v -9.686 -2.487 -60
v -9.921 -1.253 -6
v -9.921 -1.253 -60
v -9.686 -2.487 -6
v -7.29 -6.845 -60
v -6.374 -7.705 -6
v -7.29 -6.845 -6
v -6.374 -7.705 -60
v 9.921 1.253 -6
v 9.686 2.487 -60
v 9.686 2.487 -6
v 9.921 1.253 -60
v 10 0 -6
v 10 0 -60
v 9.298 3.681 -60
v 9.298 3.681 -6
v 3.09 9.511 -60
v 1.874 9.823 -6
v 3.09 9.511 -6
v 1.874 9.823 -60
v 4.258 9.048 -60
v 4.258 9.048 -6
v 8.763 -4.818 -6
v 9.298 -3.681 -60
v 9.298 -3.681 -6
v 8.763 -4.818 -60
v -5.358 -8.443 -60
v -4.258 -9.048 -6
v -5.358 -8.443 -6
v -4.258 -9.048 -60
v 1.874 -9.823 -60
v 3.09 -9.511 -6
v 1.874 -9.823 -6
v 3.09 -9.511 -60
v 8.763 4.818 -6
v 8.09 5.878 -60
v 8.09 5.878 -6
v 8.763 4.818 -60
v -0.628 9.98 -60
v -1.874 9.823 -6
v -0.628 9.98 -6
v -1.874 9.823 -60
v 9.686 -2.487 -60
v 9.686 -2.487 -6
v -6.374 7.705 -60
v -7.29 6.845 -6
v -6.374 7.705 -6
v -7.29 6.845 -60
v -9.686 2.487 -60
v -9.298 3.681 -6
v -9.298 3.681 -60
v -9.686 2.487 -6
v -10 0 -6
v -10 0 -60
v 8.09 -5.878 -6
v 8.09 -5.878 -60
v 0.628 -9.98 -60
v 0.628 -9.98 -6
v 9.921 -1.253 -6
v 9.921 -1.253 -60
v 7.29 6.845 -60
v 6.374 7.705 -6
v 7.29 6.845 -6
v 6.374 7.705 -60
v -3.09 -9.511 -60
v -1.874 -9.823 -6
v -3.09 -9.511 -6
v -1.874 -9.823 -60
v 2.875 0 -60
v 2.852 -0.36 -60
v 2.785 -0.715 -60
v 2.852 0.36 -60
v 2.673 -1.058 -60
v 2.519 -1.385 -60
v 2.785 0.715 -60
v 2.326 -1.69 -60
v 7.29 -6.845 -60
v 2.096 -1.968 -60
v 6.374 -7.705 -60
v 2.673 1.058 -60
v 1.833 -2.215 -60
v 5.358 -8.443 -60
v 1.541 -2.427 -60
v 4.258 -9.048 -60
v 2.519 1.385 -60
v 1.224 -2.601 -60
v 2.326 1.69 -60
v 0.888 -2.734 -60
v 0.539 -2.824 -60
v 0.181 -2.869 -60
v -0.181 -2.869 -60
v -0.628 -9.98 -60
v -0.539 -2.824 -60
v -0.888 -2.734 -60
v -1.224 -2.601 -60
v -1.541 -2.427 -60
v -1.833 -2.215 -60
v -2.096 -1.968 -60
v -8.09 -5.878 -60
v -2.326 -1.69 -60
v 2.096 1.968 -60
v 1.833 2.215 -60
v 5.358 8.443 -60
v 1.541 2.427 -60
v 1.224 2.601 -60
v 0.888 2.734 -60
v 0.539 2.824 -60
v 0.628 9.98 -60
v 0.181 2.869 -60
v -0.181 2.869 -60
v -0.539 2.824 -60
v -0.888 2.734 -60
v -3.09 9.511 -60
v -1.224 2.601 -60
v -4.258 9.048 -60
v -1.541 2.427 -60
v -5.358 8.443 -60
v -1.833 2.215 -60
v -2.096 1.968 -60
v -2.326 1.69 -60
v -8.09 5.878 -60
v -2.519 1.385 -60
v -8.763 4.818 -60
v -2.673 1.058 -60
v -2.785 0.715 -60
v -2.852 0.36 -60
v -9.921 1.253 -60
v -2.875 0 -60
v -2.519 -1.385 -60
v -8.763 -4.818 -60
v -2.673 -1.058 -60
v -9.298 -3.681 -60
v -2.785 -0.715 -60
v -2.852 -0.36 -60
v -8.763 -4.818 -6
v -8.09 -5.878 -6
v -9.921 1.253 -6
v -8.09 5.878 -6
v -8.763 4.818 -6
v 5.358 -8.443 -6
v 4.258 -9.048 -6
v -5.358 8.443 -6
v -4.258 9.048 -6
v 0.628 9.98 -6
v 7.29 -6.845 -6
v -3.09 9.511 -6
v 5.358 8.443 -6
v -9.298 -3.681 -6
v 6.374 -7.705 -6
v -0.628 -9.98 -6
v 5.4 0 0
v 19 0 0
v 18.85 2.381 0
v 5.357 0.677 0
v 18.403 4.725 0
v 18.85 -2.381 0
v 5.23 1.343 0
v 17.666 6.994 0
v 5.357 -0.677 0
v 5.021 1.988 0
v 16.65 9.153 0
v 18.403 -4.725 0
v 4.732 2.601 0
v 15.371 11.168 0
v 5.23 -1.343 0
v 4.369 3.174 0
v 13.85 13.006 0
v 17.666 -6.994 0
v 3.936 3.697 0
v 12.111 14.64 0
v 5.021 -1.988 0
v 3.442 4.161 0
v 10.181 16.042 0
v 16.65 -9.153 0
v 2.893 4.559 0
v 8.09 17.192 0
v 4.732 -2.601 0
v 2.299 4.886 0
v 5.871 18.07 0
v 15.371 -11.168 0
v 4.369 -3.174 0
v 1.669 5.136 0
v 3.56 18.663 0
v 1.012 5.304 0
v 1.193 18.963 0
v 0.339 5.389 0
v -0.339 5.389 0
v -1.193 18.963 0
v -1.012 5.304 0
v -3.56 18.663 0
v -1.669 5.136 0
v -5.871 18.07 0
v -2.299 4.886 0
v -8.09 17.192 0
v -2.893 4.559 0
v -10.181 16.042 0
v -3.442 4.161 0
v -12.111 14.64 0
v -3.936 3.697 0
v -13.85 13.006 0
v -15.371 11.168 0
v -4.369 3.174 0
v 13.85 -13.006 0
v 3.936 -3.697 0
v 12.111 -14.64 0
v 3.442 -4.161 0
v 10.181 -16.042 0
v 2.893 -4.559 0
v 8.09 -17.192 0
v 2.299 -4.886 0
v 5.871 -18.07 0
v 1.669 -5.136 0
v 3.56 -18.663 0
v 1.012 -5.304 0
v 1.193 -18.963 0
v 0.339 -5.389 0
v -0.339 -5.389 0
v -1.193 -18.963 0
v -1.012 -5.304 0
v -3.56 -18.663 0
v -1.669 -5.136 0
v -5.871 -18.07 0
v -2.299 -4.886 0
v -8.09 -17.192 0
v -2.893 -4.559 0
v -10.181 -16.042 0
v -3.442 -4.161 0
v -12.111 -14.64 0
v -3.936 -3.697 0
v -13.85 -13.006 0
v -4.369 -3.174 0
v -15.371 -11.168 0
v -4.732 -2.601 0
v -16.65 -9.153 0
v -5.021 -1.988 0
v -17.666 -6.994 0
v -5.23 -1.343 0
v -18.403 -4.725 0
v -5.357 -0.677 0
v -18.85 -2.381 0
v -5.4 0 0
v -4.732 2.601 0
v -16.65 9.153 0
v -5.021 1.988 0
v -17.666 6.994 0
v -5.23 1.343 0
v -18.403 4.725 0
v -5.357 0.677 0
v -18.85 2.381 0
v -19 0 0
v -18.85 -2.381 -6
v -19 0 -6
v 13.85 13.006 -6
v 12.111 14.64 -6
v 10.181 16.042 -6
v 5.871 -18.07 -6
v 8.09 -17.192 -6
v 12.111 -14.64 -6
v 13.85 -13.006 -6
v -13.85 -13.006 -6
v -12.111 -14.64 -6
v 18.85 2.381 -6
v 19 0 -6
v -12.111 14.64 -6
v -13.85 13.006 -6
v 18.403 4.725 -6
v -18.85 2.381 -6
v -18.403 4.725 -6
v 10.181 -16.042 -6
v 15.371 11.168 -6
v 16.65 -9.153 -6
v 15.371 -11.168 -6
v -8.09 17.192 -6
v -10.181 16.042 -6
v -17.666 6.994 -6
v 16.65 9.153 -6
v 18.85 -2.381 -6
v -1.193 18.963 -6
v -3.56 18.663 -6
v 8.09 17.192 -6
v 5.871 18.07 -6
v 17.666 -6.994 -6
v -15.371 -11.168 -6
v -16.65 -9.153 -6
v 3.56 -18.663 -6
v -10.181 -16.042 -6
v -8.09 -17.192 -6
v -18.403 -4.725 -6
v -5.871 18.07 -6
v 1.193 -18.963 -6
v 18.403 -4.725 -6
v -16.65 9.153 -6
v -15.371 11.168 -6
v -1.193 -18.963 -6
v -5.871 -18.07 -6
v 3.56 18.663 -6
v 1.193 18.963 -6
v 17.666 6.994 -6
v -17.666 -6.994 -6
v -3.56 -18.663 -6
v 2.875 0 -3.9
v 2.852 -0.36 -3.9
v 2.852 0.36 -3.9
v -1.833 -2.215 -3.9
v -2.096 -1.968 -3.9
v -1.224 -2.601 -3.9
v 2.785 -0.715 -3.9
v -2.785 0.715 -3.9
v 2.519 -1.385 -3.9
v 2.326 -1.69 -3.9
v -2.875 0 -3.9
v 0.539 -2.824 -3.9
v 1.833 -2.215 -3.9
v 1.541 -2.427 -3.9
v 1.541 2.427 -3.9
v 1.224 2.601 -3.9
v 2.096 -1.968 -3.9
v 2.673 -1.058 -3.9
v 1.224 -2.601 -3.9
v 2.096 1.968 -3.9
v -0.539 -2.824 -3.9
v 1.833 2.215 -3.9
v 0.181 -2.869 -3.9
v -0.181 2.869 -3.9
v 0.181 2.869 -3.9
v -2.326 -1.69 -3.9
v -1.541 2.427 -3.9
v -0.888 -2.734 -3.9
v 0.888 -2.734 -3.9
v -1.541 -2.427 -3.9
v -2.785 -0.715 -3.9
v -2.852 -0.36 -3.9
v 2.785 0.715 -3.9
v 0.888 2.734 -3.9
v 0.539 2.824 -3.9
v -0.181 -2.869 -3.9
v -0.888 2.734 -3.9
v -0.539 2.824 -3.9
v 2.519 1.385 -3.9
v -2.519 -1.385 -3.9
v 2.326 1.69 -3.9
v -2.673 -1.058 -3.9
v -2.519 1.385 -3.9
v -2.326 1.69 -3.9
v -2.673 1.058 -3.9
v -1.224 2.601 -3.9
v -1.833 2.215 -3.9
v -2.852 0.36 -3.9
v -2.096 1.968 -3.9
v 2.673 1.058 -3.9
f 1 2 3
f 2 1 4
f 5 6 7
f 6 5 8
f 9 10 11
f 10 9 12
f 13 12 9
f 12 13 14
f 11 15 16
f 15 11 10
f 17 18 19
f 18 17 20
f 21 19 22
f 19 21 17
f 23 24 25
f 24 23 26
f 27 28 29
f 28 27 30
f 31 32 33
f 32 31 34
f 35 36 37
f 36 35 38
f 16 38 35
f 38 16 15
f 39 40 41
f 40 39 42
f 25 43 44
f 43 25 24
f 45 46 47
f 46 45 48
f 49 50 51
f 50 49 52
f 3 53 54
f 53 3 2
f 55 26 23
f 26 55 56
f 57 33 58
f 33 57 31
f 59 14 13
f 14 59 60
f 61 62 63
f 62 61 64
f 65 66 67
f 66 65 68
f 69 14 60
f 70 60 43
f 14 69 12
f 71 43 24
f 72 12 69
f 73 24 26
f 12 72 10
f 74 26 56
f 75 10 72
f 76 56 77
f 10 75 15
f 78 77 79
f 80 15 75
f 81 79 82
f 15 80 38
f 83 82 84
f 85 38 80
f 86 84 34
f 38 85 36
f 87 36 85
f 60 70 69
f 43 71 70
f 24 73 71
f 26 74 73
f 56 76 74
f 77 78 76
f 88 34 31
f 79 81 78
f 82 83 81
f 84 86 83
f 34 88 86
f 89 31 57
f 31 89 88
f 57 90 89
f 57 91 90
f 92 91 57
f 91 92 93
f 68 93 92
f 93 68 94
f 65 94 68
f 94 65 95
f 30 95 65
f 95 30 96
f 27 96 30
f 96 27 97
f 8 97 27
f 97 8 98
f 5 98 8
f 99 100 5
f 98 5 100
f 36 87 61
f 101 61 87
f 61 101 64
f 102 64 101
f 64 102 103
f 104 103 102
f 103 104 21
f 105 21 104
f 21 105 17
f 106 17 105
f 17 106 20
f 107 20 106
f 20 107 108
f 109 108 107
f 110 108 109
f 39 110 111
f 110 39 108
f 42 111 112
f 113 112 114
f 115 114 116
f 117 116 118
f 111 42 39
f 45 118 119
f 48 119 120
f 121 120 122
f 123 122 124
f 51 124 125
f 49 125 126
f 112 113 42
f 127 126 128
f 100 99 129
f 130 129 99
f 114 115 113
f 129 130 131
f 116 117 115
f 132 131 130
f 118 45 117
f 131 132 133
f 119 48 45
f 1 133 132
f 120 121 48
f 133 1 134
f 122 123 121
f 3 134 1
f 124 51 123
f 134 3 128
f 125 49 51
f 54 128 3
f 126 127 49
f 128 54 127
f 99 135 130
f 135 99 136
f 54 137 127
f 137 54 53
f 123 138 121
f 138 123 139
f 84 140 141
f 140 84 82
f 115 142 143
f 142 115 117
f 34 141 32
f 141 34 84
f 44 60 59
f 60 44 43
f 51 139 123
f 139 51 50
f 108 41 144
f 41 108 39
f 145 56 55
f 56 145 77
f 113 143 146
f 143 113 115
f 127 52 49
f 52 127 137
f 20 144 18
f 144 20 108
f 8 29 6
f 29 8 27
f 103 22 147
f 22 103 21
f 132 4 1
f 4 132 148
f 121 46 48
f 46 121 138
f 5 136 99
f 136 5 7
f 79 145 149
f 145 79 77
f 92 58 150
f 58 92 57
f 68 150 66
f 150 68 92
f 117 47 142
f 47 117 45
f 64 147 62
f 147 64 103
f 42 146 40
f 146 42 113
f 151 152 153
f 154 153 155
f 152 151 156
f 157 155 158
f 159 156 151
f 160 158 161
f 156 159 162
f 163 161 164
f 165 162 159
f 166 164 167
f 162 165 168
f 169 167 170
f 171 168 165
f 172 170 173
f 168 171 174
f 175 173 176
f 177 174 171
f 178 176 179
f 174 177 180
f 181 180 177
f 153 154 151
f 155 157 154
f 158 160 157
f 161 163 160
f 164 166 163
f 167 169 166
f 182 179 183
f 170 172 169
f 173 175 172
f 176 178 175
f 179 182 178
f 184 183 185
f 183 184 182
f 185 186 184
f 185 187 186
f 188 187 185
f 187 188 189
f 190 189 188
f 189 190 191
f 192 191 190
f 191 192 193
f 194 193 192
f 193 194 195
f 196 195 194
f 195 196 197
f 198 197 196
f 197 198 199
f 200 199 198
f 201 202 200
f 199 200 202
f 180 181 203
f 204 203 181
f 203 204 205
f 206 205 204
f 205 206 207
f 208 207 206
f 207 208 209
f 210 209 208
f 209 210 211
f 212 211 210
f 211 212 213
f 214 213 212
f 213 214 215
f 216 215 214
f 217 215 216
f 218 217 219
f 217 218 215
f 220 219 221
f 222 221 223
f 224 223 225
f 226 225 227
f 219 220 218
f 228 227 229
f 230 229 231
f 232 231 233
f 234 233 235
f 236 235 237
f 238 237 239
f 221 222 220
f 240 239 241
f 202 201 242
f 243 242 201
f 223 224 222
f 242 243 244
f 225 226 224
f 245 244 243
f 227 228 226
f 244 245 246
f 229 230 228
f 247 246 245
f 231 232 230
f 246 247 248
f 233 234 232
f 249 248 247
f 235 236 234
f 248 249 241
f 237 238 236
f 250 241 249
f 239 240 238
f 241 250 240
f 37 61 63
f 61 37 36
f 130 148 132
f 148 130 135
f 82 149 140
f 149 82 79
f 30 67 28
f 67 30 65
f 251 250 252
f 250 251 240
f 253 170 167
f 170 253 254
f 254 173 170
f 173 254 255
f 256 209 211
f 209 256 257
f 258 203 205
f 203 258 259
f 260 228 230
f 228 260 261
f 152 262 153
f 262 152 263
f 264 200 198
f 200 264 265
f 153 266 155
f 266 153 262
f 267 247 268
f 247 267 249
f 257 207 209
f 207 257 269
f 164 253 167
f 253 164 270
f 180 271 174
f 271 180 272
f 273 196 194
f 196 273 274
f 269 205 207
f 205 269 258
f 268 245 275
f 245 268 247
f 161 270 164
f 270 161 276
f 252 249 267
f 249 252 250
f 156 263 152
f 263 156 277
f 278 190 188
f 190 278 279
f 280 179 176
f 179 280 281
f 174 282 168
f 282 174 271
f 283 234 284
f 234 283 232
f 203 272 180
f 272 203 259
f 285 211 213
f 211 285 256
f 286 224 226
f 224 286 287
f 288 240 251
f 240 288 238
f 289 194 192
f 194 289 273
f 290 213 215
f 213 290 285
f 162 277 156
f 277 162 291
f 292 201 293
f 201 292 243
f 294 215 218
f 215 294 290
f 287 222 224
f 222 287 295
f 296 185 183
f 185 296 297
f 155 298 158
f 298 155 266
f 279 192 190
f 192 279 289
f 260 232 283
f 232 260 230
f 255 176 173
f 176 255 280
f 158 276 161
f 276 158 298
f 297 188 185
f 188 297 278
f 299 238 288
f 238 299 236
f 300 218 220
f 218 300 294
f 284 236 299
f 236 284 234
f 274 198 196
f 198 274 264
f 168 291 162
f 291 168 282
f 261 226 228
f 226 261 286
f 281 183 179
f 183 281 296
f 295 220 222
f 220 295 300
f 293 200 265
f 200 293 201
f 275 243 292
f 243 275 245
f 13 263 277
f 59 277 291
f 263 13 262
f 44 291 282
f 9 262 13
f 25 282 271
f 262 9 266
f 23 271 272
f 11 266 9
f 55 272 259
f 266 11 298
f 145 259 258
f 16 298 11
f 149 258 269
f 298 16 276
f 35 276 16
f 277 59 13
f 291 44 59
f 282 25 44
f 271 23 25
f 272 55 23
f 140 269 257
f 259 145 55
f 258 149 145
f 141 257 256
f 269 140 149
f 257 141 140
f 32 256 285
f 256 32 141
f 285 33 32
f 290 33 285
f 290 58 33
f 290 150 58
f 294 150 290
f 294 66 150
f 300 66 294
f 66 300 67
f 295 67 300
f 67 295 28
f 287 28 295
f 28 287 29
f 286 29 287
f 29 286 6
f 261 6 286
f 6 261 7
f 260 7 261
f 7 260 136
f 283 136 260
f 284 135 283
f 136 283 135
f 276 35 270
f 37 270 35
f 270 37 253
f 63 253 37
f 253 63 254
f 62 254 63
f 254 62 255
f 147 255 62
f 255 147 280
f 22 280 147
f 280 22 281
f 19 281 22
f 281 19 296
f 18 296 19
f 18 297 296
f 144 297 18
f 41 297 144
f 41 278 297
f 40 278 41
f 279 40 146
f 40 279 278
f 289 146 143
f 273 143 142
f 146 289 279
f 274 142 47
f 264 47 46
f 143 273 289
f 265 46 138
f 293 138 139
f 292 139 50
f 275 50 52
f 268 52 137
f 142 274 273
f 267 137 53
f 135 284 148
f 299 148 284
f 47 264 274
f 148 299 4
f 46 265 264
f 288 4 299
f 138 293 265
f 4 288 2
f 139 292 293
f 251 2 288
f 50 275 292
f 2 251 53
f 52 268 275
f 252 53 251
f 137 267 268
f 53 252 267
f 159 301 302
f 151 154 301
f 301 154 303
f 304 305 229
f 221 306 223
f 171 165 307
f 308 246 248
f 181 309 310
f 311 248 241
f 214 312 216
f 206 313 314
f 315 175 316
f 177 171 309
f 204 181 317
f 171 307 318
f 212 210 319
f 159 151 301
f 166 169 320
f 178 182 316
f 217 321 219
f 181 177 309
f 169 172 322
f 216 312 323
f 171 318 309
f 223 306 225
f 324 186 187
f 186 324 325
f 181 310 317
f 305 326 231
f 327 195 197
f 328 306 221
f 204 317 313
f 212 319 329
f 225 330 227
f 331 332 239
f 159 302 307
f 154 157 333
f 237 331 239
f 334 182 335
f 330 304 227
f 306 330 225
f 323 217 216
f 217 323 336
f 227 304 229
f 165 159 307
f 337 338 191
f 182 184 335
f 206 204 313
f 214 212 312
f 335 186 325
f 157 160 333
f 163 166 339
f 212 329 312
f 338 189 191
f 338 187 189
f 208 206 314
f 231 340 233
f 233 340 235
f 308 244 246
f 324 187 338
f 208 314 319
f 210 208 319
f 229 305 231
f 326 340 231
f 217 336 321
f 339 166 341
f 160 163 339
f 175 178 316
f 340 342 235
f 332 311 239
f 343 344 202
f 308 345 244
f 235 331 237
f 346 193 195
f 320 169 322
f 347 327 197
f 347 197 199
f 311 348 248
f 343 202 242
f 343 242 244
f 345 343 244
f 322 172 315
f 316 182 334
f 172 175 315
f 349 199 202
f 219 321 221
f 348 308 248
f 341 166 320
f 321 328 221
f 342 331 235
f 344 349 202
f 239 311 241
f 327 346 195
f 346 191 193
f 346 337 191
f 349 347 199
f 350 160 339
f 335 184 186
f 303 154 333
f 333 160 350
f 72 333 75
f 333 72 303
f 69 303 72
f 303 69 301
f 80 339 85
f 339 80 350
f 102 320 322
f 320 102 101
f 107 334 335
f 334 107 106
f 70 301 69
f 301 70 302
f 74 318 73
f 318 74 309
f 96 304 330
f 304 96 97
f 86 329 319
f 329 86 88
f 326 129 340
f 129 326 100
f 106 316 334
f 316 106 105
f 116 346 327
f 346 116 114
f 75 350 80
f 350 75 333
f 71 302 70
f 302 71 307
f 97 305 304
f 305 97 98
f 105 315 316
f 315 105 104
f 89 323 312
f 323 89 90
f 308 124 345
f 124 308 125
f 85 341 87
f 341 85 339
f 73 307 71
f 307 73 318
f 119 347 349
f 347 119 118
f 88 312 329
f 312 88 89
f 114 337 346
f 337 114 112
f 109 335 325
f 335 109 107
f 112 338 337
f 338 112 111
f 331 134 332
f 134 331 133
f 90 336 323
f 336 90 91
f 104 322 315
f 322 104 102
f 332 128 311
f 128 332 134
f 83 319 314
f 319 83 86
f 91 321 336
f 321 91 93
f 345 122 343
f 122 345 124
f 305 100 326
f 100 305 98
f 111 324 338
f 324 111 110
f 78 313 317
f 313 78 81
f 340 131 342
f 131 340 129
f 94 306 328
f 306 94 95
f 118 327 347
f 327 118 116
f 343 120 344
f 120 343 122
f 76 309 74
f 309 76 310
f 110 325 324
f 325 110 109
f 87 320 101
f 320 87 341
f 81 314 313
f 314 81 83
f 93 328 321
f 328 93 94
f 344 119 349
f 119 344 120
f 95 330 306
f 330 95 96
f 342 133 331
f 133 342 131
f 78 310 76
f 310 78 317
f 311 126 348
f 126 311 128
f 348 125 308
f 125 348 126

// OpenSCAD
$fn = 50;


difference() {
	union() {
		translate(v = [0, 0, -60.0000000000]) {
			cylinder(h = 60, r = 10.0000000000);
		}
		translate(v = [0, 0, -6.0000000000]) {
			cylinder(h = 6, r = 19.0000000000);
		}
	}
	union() {
		translate(v = [0, 0, 0]) {
			rotate(a = [0, 0, 0]) {
				difference() {
					union() {
						#translate(v = [0, 0, -60.0000000000]) {
							cylinder(h = 60, r = 2.6000000000);
						}
						#translate(v = [0, 0, -3.9000000000]) {
							cylinder(h = 3.9000000000, r1 = 2.8750000000, r2 = 5.4000000000);
						}
						#translate(v = [0, 0, -60.0000000000]) {
							cylinder(h = 60, r = 2.8750000000);
						}
						#translate(v = [0, 0, -60.0000000000]) {
							cylinder(h = 60, r = 2.6000000000);
						}
					}
					union();
				}
			}
		}
	}
}
